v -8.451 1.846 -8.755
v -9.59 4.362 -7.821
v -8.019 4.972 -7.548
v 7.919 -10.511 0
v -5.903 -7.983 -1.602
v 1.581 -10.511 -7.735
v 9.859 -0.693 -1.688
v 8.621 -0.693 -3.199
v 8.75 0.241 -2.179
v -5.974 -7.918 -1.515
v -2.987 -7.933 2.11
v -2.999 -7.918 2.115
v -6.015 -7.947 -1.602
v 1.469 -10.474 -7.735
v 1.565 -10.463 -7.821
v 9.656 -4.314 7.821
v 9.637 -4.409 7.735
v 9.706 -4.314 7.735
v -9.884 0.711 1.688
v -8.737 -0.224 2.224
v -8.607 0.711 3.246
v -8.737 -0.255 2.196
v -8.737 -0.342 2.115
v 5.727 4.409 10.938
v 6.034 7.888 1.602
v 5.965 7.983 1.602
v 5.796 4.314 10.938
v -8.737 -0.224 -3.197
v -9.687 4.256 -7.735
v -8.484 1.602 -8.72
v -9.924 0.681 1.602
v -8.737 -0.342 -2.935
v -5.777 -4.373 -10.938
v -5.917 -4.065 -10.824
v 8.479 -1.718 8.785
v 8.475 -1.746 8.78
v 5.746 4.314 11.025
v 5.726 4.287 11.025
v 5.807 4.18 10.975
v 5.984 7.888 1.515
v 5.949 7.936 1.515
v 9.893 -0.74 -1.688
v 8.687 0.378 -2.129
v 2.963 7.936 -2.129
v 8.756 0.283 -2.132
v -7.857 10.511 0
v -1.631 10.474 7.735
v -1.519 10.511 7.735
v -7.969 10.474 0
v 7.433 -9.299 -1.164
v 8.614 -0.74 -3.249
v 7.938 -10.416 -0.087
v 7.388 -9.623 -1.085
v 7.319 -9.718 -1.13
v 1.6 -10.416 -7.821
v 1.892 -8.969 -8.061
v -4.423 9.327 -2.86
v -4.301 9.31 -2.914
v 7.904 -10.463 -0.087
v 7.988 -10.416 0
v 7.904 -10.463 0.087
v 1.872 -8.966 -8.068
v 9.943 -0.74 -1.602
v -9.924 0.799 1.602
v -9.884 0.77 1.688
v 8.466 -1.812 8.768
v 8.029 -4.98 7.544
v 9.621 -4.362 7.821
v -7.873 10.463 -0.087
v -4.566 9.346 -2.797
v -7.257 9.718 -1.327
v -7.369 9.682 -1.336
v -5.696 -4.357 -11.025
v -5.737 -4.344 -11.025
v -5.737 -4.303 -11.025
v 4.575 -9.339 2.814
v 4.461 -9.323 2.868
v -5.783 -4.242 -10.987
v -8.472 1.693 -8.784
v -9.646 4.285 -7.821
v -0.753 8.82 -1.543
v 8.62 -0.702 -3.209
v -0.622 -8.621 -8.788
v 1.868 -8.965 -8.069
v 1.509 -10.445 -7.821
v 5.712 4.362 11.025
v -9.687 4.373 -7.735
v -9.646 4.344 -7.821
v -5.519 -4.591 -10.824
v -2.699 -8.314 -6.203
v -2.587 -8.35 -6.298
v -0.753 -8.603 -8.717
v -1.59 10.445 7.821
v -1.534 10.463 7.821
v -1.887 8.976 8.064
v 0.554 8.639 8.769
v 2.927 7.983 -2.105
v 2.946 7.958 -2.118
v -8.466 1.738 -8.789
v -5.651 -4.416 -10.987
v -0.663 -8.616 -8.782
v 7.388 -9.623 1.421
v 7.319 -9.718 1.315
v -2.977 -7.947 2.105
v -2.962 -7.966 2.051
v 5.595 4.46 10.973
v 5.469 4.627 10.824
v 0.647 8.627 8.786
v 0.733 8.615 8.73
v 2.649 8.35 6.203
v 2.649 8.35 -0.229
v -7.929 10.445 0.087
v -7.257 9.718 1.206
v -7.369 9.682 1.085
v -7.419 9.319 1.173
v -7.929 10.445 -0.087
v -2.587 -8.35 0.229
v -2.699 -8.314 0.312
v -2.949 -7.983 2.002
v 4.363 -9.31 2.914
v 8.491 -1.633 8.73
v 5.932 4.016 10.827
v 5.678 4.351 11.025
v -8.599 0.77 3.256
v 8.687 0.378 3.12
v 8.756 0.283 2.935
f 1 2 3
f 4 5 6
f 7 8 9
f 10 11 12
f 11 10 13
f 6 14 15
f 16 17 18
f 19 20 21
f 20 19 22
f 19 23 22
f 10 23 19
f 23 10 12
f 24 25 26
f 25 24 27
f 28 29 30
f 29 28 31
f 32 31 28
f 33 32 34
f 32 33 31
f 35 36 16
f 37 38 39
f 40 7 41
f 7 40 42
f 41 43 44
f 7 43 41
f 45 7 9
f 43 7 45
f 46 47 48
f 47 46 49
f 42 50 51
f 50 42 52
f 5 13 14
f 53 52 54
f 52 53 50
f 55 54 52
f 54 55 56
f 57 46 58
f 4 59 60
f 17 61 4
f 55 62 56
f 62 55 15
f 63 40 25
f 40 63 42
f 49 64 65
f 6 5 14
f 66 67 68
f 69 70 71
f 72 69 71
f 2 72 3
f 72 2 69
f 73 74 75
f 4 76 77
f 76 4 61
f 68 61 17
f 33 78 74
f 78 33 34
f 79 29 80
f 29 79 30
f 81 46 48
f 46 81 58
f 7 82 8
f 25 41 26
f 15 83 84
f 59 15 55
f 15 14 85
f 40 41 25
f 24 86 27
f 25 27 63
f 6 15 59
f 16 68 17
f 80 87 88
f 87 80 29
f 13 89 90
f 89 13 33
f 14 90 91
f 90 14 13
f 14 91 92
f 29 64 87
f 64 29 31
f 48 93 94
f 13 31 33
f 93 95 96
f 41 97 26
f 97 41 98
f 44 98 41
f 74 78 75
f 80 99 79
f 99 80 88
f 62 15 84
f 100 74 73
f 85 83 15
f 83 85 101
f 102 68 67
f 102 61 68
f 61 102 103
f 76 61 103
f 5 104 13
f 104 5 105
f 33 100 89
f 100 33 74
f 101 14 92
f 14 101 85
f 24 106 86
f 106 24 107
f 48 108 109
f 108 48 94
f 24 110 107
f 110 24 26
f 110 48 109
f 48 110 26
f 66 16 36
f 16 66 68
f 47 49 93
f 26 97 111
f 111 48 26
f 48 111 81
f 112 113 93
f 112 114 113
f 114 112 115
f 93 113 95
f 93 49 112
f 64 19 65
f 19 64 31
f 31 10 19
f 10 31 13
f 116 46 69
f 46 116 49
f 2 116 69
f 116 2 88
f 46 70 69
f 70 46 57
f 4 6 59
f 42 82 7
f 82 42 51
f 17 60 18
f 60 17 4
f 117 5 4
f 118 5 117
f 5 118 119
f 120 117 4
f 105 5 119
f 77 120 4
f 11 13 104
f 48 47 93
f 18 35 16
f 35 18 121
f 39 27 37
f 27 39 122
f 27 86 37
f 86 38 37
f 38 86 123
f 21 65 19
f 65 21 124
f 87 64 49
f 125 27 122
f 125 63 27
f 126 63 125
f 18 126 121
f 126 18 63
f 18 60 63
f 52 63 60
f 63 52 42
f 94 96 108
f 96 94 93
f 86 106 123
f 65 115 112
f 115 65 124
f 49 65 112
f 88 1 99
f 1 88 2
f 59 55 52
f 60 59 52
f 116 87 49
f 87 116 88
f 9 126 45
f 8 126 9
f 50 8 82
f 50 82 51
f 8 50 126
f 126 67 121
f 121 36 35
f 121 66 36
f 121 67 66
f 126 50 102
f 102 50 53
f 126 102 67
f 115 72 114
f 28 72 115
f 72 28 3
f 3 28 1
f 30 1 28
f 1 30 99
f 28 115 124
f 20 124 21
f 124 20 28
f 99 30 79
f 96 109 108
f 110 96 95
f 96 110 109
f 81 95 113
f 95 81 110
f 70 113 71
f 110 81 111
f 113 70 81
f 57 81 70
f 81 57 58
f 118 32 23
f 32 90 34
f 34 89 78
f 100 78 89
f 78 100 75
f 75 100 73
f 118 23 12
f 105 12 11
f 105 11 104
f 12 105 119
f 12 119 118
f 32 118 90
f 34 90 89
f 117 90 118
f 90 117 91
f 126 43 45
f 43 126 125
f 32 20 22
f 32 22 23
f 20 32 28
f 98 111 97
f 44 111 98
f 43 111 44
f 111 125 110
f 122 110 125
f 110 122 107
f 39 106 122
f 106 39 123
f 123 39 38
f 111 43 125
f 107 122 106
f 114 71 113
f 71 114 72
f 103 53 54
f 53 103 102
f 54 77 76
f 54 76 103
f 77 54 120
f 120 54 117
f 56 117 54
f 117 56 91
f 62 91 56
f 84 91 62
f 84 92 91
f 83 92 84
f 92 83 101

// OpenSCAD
// Auto-generated OpenSCAD file

    inner_points = 10*[[0.7287883694352655, -0.9622755809862549, 0.4999999999999998], [0.728788369435265, -0.9622755809862551, -0.5000000000000002], [-0.728788369435265, 0.9622755809862551, 0.5000000000000002], [-0.7287883694352655, 0.9622755809862549, -0.4999999999999998], [0.30187402671986113, -0.3985875963849562, 1.2071067811865475], [0.3018740267198599, -0.39858759638495667, -1.2071067811865475], [-0.3018740267198599, 0.39858759638495667, 1.2071067811865475], [-0.30187402671986113, 0.3985875963849562, -1.2071067811865475], [-0.26181395788143796, -0.8255019391003613, 0.5000000000000002], [0.8655620113211595, 0.02832674633044846, 0.49999999999999956], [-0.2618139578814384, -0.8255019391003613, -0.4999999999999998], [0.8655620113211591, 0.028326746330448405, -0.5000000000000004], [-0.8655620113211591, -0.028326746330448405, 0.5000000000000004], [0.2618139578814384, 0.8255019391003613, 0.4999999999999998], [-0.8655620113211595, -0.02832674633044846, -0.49999999999999956], [0.26181395788143796, 0.8255019391003613, -0.5000000000000002]];

    outer_points = 10*[[-0.5696478499849842, -0.4314281054603697, -1.093836321399554], [-0.960592326979208, 0.4314281054603697, -0.7734590825338425], [0.960592326979208, -0.4314281054603697, 0.7734590825338425], [0.5696478499849842, 0.4314281054603697, 1.093836321399554], [0.1549886117537691, -1.0415595833913545, -0.7734590782057024], [-0.7888348467405426, 1.0415595833913545, -3.0604573320047734e-09], [0.7888348467405426, -1.0415595833913545, 3.0604573320047734e-09], [-0.1549886117537691, 1.0415595833913545, 0.7734590782057024], [-0.5933626113683385, -0.7888348480349219, -0.16018861993246514], [0.3504608533757889, -0.07402136288581751, -0.9336477001994059], [-0.9843070883625624, 0.07402136288581751, 0.1601886189332462], [-0.04048362361843505, 0.7888348480349219, -0.6132704613336946], [0.04048362361843505, -0.7888348480349219, 0.6132704613336946], [0.9843070883625624, -0.07402136288581751, -0.1601886189332462], [-0.3504608533757889, 0.07402136288581751, 0.9336477001994059], [0.5933626113683385, 0.7888348480349219, 0.16018861993246514]];

    // Convex hull for inner set (I)
    module inner_hull() {
        hull() {
            for (p = inner_points) {
                translate(p) sphere(r=0.1);
            }
        }
    }

    // Convex hull for outer set (O) minus inner hull (O \ I)
    module outer_minus_inner() {
        difference() {
            hull() {
                for (p = outer_points) {
                    translate(p) sphere(r=0.1);
                }
            }
            inner_hull(); // Subtract inner hull
        }
    }

    // Convex hull for outer set (O) minus all translated inner hulls
    module outer_minus_AllTranslationInner() {
        difference() {
            hull() {
                for (p = outer_points) {
                    translate(p) sphere(r=0.1);
                }
            }
            hull() {
                translate([0,0,50]) inner_hull();
                translate([0,0,-50]) inner_hull();
            }; // Subtract translated inner hulls
        }
    }

    // Difference between outer_minus_inner and outer_minus_AllTranslationInner
    module outer_minus_inner_diff() {
        difference() {
            // Outer minus inner
            difference() {
                hull() {
                    for (p = outer_points) {
                        translate(p) sphere(r=0.1);
                    }
                }
                inner_hull();
            }

            // Subtract Outer minus AllTranslationInner
            difference() {
                hull() {
                    for (p = outer_points) {
                        translate(p) sphere(r=0.1);
                    }
                }
                hull() {
                    translate([0,0,50]) inner_hull();
                    translate([0,0,-50]) inner_hull();
                };
            }
        }
    }

    // Rendering all with colors applied
    color([0, 1, 0, 1]) outer_minus_AllTranslationInner(); // Opaque green
    
